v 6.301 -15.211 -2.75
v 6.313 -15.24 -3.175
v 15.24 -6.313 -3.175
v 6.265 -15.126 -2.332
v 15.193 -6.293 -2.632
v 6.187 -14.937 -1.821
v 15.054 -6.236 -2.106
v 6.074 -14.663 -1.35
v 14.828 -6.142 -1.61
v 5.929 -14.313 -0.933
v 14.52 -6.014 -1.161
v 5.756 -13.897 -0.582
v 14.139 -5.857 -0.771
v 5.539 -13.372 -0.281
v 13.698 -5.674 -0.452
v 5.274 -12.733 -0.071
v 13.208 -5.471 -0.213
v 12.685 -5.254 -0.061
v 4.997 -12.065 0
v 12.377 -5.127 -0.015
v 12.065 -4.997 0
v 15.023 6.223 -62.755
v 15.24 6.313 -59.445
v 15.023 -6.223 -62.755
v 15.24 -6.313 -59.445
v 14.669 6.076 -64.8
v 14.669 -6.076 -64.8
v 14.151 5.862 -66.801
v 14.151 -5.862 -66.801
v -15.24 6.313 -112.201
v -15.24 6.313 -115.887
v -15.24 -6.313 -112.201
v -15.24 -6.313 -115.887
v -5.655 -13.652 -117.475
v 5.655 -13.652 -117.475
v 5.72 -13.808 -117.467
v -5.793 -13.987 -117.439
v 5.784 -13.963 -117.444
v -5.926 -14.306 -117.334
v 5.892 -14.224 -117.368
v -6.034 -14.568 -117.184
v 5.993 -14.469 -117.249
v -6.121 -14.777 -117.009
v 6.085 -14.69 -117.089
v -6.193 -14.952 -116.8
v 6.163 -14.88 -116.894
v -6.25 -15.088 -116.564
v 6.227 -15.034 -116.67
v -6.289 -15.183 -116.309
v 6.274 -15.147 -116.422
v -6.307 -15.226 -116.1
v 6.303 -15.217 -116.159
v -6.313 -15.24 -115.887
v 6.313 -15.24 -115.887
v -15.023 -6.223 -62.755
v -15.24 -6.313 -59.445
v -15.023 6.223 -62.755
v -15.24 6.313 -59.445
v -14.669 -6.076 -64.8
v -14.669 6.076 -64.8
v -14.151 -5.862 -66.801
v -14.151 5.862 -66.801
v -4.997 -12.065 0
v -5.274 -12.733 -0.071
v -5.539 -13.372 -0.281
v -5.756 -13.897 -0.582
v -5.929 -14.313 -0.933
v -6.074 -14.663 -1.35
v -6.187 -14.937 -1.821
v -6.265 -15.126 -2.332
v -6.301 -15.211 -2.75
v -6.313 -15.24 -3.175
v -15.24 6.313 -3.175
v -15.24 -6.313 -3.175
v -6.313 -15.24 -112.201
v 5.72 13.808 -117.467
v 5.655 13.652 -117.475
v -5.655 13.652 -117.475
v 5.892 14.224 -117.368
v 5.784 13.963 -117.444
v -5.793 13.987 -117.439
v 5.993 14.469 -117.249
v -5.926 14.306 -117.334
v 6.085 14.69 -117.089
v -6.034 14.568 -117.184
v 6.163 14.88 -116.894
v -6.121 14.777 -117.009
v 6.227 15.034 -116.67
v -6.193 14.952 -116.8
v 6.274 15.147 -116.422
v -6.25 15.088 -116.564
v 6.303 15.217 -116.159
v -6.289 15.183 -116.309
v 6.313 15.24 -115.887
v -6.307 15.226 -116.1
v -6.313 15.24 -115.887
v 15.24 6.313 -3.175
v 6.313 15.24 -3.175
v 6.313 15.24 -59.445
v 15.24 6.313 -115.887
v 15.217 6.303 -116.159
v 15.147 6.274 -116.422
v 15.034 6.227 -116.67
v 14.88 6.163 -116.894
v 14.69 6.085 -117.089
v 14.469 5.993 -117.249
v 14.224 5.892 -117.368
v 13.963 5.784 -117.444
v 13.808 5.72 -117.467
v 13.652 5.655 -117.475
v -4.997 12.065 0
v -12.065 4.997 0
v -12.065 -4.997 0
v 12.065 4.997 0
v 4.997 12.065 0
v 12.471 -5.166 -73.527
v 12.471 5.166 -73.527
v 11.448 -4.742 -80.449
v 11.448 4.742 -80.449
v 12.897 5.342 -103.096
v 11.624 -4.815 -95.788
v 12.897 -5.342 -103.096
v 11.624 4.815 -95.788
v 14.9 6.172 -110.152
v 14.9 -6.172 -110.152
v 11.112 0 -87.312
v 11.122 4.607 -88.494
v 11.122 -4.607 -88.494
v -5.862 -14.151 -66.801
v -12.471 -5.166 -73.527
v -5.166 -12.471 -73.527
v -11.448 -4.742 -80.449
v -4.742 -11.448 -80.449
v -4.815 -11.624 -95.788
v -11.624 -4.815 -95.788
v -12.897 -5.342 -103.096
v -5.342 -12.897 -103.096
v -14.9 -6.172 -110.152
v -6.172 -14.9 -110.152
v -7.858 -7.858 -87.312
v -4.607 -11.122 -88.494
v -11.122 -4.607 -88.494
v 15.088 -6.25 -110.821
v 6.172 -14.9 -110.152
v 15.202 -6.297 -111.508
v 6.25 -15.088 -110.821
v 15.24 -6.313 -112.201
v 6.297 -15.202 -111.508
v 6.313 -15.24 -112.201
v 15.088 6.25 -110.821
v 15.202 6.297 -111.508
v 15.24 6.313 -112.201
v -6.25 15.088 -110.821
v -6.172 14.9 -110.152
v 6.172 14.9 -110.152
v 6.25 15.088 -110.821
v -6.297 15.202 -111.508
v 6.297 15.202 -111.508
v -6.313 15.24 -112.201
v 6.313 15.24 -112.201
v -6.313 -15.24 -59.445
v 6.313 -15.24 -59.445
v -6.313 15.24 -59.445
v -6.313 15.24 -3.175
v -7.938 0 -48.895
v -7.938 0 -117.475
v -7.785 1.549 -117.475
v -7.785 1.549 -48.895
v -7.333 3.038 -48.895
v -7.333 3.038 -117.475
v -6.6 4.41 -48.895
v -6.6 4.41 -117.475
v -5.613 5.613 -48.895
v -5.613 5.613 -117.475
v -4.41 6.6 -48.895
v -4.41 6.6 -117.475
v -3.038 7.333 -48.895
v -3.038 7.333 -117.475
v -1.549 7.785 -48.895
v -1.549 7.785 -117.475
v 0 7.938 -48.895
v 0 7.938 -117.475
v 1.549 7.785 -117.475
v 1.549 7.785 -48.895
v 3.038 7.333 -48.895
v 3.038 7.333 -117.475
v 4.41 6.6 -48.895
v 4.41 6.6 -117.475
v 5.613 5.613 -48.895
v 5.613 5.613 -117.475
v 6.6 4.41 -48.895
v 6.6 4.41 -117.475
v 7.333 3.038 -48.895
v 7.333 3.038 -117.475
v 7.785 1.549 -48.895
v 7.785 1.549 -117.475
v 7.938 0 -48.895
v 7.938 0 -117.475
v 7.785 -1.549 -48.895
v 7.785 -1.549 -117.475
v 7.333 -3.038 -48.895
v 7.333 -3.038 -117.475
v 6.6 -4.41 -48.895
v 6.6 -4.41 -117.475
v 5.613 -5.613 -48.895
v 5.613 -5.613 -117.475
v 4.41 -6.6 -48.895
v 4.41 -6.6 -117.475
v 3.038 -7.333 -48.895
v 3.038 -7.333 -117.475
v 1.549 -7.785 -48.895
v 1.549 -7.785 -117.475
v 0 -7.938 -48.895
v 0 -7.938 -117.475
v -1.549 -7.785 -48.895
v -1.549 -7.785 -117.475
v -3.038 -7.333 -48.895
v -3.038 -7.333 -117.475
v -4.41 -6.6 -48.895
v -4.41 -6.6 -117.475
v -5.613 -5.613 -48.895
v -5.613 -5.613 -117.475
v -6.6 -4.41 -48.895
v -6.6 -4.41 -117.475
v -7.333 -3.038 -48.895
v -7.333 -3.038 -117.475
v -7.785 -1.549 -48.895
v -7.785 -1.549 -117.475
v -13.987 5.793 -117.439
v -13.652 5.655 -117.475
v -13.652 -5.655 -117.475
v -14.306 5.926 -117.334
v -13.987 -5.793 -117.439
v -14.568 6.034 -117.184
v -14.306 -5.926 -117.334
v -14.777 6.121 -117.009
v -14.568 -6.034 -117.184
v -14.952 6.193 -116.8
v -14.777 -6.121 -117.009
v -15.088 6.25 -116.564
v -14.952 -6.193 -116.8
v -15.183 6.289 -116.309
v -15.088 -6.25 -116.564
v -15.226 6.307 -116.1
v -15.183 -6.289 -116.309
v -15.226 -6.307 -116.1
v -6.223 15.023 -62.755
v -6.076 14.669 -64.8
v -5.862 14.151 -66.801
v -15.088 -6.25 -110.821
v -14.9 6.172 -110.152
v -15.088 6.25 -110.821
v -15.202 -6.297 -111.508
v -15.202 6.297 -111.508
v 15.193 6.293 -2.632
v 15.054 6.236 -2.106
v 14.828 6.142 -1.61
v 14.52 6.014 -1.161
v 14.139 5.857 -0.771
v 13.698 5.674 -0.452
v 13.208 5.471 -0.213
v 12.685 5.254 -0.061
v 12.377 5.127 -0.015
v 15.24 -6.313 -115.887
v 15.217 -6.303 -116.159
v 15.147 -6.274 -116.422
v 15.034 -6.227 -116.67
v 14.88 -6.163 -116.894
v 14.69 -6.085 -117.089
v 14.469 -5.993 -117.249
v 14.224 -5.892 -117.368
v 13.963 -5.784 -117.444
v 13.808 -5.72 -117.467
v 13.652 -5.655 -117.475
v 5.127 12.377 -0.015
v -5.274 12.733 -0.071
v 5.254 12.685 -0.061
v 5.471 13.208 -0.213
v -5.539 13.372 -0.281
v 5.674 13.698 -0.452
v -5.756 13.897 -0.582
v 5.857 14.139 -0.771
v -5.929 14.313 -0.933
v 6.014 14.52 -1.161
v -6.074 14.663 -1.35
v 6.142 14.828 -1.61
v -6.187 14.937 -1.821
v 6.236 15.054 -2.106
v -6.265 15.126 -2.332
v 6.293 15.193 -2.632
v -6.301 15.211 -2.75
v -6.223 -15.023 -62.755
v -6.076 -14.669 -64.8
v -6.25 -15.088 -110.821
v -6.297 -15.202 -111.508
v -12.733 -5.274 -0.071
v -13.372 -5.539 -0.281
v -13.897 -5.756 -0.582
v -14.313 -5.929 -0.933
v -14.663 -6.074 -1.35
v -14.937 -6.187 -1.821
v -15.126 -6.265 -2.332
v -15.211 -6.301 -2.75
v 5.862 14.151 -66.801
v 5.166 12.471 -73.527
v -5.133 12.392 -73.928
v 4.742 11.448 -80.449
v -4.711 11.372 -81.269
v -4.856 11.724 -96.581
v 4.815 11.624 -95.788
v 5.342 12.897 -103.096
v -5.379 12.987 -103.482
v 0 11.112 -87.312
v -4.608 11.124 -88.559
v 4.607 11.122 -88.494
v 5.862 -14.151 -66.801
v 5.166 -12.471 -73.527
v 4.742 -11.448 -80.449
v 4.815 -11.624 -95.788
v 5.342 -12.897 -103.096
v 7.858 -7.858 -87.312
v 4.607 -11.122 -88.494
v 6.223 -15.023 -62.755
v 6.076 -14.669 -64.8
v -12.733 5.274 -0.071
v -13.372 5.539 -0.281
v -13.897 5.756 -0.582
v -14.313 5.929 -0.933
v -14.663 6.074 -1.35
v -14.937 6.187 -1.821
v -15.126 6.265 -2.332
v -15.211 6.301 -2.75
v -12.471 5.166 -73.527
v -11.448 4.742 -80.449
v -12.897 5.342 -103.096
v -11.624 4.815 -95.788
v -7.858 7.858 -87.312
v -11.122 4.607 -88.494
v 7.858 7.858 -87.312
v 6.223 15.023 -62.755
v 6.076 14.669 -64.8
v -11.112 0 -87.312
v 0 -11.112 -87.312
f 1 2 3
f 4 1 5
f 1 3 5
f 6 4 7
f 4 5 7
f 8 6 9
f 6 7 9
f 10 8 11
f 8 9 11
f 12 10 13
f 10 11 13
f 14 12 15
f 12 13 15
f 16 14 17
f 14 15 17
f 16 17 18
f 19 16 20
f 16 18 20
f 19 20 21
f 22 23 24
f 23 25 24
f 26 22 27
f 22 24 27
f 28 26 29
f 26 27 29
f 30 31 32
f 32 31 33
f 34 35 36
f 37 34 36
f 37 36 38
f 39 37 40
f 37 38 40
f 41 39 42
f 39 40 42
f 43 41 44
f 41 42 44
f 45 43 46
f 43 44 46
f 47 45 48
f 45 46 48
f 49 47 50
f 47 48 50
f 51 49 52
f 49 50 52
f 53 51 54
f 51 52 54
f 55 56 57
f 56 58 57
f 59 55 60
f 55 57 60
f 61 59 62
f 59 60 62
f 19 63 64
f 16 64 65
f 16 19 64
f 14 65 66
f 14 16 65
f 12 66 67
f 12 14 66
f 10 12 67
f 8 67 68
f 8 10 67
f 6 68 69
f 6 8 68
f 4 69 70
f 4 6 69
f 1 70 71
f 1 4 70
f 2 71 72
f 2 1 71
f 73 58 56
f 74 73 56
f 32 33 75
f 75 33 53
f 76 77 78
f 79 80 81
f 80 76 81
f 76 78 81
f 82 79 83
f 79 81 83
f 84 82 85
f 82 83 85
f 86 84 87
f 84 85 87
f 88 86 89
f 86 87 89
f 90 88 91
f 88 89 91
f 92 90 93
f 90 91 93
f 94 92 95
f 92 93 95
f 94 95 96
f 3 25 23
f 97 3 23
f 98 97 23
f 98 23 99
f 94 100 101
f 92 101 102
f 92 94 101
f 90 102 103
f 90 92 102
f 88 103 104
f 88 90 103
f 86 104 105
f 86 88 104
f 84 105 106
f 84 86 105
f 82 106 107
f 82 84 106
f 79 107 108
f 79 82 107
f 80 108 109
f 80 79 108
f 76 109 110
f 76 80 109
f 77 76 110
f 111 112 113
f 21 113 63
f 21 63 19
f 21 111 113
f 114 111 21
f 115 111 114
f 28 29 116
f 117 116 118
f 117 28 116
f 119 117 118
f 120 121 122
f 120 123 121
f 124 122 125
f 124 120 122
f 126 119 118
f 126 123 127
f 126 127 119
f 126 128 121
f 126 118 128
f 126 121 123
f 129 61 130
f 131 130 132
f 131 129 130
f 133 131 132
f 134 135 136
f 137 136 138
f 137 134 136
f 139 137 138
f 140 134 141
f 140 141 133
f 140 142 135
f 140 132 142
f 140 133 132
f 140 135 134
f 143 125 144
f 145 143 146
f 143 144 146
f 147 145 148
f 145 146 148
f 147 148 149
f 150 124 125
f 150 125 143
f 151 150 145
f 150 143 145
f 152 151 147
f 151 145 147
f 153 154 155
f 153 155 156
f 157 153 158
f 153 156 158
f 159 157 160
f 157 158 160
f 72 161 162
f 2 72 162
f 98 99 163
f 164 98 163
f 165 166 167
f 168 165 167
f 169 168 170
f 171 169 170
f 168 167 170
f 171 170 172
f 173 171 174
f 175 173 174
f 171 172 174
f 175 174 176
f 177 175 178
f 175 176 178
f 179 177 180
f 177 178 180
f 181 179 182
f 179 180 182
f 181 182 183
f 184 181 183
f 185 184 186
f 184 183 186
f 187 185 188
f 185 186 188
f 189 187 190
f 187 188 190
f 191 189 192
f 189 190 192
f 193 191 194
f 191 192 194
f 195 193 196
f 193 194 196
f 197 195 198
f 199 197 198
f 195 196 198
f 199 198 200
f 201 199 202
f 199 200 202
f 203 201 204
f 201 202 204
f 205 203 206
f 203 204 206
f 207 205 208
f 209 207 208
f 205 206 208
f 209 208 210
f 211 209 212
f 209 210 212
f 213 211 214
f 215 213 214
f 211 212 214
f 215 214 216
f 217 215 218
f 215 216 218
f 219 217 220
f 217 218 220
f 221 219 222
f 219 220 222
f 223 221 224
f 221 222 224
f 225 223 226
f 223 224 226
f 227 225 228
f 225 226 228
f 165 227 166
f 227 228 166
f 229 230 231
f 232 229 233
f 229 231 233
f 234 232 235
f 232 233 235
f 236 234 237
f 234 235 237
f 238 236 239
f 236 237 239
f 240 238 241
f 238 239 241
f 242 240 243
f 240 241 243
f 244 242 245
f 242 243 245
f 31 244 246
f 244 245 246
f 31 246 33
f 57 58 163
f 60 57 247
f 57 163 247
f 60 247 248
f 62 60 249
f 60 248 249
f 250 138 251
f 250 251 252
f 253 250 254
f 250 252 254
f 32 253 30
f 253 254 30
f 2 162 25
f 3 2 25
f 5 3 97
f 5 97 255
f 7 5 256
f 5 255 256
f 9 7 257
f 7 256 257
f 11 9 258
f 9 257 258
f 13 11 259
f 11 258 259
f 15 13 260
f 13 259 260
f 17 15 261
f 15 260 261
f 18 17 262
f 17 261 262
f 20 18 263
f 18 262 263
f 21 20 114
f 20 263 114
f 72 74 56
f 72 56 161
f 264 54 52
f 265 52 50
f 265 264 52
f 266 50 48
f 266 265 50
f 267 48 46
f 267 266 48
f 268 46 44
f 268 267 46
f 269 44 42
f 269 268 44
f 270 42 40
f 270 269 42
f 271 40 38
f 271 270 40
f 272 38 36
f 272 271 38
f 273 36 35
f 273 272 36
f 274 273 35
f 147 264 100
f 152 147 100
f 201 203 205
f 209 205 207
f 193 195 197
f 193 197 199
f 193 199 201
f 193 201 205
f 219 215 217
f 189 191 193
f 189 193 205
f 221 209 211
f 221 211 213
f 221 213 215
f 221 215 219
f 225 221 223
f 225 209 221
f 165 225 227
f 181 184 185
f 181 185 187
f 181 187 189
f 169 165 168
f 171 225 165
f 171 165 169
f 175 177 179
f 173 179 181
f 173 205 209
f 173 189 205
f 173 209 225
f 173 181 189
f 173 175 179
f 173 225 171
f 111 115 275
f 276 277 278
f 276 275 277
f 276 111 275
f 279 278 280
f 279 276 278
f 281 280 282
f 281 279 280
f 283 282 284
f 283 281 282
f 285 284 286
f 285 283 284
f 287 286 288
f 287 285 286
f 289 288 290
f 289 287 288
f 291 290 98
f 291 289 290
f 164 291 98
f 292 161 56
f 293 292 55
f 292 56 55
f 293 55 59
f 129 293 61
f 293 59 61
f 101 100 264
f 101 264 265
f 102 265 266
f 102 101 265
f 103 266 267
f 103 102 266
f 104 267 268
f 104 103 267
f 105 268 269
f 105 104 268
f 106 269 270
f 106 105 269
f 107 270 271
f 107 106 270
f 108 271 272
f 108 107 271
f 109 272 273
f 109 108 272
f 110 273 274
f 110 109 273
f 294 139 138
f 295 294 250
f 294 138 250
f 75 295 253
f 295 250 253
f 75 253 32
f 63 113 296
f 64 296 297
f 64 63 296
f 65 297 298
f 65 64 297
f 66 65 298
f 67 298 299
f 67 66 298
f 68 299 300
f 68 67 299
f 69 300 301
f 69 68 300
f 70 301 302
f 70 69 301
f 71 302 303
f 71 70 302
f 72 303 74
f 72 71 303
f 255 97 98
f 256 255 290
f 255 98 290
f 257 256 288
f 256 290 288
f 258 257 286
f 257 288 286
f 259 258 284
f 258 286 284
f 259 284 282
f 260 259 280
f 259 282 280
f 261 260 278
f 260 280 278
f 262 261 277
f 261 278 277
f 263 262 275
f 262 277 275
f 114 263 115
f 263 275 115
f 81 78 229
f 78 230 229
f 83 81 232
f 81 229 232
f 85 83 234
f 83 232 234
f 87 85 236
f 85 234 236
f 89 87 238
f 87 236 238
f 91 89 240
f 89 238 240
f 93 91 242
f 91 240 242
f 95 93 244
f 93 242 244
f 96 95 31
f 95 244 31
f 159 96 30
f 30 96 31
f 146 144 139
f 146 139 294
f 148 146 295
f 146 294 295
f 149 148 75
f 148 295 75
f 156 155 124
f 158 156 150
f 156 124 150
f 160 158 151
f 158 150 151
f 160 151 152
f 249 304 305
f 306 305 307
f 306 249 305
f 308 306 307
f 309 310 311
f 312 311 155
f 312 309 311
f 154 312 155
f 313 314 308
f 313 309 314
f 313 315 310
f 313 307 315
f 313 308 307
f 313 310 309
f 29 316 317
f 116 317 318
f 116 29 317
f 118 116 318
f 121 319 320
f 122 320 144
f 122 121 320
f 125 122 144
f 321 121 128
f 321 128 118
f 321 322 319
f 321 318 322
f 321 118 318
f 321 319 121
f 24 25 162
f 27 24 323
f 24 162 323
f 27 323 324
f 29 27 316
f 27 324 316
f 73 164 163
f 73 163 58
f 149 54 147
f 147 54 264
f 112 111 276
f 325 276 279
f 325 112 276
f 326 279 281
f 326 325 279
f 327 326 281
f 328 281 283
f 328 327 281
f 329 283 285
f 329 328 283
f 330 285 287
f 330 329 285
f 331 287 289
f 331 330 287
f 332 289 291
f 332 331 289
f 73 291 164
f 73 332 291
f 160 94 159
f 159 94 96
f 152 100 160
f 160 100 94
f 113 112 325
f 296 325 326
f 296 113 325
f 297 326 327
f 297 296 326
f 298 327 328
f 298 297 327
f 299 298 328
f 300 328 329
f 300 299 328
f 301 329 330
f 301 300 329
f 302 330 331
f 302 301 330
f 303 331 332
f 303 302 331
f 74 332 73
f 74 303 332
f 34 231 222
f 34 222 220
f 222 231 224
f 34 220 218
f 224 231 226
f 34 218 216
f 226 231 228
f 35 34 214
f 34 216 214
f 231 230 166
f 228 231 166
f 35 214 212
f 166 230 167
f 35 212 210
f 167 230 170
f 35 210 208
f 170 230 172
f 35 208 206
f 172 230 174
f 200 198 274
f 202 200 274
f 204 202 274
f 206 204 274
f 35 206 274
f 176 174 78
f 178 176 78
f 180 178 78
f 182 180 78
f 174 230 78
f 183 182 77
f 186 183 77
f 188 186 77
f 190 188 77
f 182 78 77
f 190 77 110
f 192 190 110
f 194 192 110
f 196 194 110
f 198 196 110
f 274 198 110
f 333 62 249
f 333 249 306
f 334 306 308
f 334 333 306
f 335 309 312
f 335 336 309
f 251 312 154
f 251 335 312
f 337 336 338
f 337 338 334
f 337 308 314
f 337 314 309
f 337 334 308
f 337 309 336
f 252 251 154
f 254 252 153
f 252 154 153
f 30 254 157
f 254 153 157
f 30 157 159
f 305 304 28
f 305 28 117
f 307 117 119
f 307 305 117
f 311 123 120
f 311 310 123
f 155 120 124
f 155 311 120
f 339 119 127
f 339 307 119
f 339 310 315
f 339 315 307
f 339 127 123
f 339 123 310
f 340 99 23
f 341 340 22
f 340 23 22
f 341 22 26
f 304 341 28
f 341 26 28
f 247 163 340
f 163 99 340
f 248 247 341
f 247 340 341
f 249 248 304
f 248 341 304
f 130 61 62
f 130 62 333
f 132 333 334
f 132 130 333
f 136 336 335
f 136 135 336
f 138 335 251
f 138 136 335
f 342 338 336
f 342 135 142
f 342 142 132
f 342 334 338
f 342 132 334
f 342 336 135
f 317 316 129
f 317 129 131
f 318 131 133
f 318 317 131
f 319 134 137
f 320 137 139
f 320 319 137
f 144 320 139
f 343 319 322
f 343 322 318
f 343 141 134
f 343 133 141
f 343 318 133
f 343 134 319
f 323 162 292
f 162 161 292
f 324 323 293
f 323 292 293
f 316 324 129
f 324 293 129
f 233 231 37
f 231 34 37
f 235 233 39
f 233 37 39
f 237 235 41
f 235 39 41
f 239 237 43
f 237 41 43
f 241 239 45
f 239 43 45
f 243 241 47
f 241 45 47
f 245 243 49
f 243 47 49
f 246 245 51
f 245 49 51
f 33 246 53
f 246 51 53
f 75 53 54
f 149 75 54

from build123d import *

# Parameters (mm, degrees)
CUT_SWEEP1_START   = -10.440114653
CUT_SWEEP1_DEPTH   = 20.880229306
CIRPATTERN1_COUNT  = 8
SKETCH5_R          = 7.9375
CUT_EXTRUDE1_DEPTH = 68.58
FILLET1_R          = 1.5875
FILLET2_R          = 3.175
FILLET3_R          = 25.4
FILLET4_R          = 6.35


# Read off the part's stored shape, not the designer's step: Cut-Sweep1
with BuildPart() as part:
    # Sweep2: sweep along a path in Sketch3
    with BuildLine(Plane(origin=(0, 0, 0), x_dir=(0, 0, -1), z_dir=(1, 0, 0))) as sweep2_path:
        Line((0, 0), (117.475, 0))
    # Sketch1 → Sweep2 (sweep)
    with BuildSketch(Plane.XY):
        Polygon((15.24, -6.312614691), (15.24, 6.312614691), (6.312614691, 15.24), (-6.312614691, 15.24), (-15.24, 6.312614691), (-15.24, -6.312614691), (-6.312614691, -15.24), (6.312614691, -15.24), align=None)
    sweep(path=sweep2_path.line)

    # Cut-Sweep1 outline → Cut-Sweep1 (cut)
    with BuildSketch(Plane.YZ.offset(CUT_SWEEP1_START)):
        with BuildLine():
            Line((15.24, -111.125), (15.24, -63.5))
            add(Edge.make_bspline(
                [(15.24, -63.5), (12.515117075, -71.124082686), (11.1125, -79.21695815), (11.1125, -95.40804185), (12.515117075, -103.500917314), (15.24, -111.125)],
                knots=[0, 0, 0, 0, 0.5, 0.5, 1, 1, 1, 1], degree=3))
        make_face()
    cut_sweep1 = extrude(amount=CUT_SWEEP1_DEPTH, mode=Mode.SUBTRACT)

    # CirPattern1: Cut-Sweep1 ×8 about axis
    cirpattern1_axis = Axis((0, 0, 0), (0, 0, -1))
    for i in range(1, CIRPATTERN1_COUNT):
        add(cut_sweep1.rotate(cirpattern1_axis, i * 360 / CIRPATTERN1_COUNT), mode=Mode.SUBTRACT)

    # Sketch5 → Cut-Extrude1 (cut)
    with BuildSketch(Plane(origin=(0, 0, -117.475), x_dir=(-1, 0, 0), z_dir=(0, 0, -1))):
        Circle(SKETCH5_R)
    extrude(amount=-CUT_EXTRUDE1_DEPTH, mode=Mode.SUBTRACT)

    # Fillet1
    fillet1_edges = [part.edges().sort_by_distance(p)[0] for p in [
        (10.776307345, -10.776307345, -117.475),
        (15.24, 0, -117.475),
        (10.776307345, 10.776307345, -117.475),
        (0, 15.24, -117.475),
        (-10.776307345, 10.776307345, -117.475),
        (-15.24, 0, -117.475),
        (-10.776307345, -10.776307345, -117.475),
        (0, -15.24, -117.475),
    ]]
    fillet(fillet1_edges, radius=FILLET1_R)

    # Fillet2
    fillet2_edges = [part.edges().sort_by_distance(p)[0] for p in [
        (15.24, 0, 0),
        (10.776307345, 10.776307345, 0),
        (0, 15.24, 0),
        (-10.776307345, 10.776307345, 0),
        (-15.24, 0, 0),
        (-10.776307345, -10.776307345, 0),
        (0, -15.24, 0),
        (10.776307345, -10.776307345, 0),
    ]]
    fillet(fillet2_edges, radius=FILLET2_R)

    # Fillet3
    fillet3_edges = [part.edges().sort_by_distance(p)[0] for p in [
        (10.776307345, 10.776307345, -63.5),
        (15.24, 0, -63.5),
        (10.776307345, -10.776307345, -63.5),
        (0, -15.24, -63.5),
        (-10.776307345, -10.776307345, -63.5),
        (-15.24, 0, -63.5),
        (-10.776307345, 10.776307345, -63.5),
        (0, 15.24, -63.5),
    ]]
    fillet(fillet3_edges, radius=FILLET3_R)

    # Fillet4
    fillet4_edges = [part.edges().sort_by_distance(p)[0] for p in [
        (-10.776307345, -10.776307345, -111.125),
        (0, -15.24, -111.125),
        (10.776307345, -10.776307345, -111.125),
        (15.24, 0, -111.125),
        (10.776307345, 10.776307345, -111.125),
        (0, 15.24, -111.125),
        (-10.776307345, 10.776307345, -111.125),
        (-15.24, 0, -111.125),
    ]]
    fillet(fillet4_edges, radius=FILLET4_R)


solid = part.part
